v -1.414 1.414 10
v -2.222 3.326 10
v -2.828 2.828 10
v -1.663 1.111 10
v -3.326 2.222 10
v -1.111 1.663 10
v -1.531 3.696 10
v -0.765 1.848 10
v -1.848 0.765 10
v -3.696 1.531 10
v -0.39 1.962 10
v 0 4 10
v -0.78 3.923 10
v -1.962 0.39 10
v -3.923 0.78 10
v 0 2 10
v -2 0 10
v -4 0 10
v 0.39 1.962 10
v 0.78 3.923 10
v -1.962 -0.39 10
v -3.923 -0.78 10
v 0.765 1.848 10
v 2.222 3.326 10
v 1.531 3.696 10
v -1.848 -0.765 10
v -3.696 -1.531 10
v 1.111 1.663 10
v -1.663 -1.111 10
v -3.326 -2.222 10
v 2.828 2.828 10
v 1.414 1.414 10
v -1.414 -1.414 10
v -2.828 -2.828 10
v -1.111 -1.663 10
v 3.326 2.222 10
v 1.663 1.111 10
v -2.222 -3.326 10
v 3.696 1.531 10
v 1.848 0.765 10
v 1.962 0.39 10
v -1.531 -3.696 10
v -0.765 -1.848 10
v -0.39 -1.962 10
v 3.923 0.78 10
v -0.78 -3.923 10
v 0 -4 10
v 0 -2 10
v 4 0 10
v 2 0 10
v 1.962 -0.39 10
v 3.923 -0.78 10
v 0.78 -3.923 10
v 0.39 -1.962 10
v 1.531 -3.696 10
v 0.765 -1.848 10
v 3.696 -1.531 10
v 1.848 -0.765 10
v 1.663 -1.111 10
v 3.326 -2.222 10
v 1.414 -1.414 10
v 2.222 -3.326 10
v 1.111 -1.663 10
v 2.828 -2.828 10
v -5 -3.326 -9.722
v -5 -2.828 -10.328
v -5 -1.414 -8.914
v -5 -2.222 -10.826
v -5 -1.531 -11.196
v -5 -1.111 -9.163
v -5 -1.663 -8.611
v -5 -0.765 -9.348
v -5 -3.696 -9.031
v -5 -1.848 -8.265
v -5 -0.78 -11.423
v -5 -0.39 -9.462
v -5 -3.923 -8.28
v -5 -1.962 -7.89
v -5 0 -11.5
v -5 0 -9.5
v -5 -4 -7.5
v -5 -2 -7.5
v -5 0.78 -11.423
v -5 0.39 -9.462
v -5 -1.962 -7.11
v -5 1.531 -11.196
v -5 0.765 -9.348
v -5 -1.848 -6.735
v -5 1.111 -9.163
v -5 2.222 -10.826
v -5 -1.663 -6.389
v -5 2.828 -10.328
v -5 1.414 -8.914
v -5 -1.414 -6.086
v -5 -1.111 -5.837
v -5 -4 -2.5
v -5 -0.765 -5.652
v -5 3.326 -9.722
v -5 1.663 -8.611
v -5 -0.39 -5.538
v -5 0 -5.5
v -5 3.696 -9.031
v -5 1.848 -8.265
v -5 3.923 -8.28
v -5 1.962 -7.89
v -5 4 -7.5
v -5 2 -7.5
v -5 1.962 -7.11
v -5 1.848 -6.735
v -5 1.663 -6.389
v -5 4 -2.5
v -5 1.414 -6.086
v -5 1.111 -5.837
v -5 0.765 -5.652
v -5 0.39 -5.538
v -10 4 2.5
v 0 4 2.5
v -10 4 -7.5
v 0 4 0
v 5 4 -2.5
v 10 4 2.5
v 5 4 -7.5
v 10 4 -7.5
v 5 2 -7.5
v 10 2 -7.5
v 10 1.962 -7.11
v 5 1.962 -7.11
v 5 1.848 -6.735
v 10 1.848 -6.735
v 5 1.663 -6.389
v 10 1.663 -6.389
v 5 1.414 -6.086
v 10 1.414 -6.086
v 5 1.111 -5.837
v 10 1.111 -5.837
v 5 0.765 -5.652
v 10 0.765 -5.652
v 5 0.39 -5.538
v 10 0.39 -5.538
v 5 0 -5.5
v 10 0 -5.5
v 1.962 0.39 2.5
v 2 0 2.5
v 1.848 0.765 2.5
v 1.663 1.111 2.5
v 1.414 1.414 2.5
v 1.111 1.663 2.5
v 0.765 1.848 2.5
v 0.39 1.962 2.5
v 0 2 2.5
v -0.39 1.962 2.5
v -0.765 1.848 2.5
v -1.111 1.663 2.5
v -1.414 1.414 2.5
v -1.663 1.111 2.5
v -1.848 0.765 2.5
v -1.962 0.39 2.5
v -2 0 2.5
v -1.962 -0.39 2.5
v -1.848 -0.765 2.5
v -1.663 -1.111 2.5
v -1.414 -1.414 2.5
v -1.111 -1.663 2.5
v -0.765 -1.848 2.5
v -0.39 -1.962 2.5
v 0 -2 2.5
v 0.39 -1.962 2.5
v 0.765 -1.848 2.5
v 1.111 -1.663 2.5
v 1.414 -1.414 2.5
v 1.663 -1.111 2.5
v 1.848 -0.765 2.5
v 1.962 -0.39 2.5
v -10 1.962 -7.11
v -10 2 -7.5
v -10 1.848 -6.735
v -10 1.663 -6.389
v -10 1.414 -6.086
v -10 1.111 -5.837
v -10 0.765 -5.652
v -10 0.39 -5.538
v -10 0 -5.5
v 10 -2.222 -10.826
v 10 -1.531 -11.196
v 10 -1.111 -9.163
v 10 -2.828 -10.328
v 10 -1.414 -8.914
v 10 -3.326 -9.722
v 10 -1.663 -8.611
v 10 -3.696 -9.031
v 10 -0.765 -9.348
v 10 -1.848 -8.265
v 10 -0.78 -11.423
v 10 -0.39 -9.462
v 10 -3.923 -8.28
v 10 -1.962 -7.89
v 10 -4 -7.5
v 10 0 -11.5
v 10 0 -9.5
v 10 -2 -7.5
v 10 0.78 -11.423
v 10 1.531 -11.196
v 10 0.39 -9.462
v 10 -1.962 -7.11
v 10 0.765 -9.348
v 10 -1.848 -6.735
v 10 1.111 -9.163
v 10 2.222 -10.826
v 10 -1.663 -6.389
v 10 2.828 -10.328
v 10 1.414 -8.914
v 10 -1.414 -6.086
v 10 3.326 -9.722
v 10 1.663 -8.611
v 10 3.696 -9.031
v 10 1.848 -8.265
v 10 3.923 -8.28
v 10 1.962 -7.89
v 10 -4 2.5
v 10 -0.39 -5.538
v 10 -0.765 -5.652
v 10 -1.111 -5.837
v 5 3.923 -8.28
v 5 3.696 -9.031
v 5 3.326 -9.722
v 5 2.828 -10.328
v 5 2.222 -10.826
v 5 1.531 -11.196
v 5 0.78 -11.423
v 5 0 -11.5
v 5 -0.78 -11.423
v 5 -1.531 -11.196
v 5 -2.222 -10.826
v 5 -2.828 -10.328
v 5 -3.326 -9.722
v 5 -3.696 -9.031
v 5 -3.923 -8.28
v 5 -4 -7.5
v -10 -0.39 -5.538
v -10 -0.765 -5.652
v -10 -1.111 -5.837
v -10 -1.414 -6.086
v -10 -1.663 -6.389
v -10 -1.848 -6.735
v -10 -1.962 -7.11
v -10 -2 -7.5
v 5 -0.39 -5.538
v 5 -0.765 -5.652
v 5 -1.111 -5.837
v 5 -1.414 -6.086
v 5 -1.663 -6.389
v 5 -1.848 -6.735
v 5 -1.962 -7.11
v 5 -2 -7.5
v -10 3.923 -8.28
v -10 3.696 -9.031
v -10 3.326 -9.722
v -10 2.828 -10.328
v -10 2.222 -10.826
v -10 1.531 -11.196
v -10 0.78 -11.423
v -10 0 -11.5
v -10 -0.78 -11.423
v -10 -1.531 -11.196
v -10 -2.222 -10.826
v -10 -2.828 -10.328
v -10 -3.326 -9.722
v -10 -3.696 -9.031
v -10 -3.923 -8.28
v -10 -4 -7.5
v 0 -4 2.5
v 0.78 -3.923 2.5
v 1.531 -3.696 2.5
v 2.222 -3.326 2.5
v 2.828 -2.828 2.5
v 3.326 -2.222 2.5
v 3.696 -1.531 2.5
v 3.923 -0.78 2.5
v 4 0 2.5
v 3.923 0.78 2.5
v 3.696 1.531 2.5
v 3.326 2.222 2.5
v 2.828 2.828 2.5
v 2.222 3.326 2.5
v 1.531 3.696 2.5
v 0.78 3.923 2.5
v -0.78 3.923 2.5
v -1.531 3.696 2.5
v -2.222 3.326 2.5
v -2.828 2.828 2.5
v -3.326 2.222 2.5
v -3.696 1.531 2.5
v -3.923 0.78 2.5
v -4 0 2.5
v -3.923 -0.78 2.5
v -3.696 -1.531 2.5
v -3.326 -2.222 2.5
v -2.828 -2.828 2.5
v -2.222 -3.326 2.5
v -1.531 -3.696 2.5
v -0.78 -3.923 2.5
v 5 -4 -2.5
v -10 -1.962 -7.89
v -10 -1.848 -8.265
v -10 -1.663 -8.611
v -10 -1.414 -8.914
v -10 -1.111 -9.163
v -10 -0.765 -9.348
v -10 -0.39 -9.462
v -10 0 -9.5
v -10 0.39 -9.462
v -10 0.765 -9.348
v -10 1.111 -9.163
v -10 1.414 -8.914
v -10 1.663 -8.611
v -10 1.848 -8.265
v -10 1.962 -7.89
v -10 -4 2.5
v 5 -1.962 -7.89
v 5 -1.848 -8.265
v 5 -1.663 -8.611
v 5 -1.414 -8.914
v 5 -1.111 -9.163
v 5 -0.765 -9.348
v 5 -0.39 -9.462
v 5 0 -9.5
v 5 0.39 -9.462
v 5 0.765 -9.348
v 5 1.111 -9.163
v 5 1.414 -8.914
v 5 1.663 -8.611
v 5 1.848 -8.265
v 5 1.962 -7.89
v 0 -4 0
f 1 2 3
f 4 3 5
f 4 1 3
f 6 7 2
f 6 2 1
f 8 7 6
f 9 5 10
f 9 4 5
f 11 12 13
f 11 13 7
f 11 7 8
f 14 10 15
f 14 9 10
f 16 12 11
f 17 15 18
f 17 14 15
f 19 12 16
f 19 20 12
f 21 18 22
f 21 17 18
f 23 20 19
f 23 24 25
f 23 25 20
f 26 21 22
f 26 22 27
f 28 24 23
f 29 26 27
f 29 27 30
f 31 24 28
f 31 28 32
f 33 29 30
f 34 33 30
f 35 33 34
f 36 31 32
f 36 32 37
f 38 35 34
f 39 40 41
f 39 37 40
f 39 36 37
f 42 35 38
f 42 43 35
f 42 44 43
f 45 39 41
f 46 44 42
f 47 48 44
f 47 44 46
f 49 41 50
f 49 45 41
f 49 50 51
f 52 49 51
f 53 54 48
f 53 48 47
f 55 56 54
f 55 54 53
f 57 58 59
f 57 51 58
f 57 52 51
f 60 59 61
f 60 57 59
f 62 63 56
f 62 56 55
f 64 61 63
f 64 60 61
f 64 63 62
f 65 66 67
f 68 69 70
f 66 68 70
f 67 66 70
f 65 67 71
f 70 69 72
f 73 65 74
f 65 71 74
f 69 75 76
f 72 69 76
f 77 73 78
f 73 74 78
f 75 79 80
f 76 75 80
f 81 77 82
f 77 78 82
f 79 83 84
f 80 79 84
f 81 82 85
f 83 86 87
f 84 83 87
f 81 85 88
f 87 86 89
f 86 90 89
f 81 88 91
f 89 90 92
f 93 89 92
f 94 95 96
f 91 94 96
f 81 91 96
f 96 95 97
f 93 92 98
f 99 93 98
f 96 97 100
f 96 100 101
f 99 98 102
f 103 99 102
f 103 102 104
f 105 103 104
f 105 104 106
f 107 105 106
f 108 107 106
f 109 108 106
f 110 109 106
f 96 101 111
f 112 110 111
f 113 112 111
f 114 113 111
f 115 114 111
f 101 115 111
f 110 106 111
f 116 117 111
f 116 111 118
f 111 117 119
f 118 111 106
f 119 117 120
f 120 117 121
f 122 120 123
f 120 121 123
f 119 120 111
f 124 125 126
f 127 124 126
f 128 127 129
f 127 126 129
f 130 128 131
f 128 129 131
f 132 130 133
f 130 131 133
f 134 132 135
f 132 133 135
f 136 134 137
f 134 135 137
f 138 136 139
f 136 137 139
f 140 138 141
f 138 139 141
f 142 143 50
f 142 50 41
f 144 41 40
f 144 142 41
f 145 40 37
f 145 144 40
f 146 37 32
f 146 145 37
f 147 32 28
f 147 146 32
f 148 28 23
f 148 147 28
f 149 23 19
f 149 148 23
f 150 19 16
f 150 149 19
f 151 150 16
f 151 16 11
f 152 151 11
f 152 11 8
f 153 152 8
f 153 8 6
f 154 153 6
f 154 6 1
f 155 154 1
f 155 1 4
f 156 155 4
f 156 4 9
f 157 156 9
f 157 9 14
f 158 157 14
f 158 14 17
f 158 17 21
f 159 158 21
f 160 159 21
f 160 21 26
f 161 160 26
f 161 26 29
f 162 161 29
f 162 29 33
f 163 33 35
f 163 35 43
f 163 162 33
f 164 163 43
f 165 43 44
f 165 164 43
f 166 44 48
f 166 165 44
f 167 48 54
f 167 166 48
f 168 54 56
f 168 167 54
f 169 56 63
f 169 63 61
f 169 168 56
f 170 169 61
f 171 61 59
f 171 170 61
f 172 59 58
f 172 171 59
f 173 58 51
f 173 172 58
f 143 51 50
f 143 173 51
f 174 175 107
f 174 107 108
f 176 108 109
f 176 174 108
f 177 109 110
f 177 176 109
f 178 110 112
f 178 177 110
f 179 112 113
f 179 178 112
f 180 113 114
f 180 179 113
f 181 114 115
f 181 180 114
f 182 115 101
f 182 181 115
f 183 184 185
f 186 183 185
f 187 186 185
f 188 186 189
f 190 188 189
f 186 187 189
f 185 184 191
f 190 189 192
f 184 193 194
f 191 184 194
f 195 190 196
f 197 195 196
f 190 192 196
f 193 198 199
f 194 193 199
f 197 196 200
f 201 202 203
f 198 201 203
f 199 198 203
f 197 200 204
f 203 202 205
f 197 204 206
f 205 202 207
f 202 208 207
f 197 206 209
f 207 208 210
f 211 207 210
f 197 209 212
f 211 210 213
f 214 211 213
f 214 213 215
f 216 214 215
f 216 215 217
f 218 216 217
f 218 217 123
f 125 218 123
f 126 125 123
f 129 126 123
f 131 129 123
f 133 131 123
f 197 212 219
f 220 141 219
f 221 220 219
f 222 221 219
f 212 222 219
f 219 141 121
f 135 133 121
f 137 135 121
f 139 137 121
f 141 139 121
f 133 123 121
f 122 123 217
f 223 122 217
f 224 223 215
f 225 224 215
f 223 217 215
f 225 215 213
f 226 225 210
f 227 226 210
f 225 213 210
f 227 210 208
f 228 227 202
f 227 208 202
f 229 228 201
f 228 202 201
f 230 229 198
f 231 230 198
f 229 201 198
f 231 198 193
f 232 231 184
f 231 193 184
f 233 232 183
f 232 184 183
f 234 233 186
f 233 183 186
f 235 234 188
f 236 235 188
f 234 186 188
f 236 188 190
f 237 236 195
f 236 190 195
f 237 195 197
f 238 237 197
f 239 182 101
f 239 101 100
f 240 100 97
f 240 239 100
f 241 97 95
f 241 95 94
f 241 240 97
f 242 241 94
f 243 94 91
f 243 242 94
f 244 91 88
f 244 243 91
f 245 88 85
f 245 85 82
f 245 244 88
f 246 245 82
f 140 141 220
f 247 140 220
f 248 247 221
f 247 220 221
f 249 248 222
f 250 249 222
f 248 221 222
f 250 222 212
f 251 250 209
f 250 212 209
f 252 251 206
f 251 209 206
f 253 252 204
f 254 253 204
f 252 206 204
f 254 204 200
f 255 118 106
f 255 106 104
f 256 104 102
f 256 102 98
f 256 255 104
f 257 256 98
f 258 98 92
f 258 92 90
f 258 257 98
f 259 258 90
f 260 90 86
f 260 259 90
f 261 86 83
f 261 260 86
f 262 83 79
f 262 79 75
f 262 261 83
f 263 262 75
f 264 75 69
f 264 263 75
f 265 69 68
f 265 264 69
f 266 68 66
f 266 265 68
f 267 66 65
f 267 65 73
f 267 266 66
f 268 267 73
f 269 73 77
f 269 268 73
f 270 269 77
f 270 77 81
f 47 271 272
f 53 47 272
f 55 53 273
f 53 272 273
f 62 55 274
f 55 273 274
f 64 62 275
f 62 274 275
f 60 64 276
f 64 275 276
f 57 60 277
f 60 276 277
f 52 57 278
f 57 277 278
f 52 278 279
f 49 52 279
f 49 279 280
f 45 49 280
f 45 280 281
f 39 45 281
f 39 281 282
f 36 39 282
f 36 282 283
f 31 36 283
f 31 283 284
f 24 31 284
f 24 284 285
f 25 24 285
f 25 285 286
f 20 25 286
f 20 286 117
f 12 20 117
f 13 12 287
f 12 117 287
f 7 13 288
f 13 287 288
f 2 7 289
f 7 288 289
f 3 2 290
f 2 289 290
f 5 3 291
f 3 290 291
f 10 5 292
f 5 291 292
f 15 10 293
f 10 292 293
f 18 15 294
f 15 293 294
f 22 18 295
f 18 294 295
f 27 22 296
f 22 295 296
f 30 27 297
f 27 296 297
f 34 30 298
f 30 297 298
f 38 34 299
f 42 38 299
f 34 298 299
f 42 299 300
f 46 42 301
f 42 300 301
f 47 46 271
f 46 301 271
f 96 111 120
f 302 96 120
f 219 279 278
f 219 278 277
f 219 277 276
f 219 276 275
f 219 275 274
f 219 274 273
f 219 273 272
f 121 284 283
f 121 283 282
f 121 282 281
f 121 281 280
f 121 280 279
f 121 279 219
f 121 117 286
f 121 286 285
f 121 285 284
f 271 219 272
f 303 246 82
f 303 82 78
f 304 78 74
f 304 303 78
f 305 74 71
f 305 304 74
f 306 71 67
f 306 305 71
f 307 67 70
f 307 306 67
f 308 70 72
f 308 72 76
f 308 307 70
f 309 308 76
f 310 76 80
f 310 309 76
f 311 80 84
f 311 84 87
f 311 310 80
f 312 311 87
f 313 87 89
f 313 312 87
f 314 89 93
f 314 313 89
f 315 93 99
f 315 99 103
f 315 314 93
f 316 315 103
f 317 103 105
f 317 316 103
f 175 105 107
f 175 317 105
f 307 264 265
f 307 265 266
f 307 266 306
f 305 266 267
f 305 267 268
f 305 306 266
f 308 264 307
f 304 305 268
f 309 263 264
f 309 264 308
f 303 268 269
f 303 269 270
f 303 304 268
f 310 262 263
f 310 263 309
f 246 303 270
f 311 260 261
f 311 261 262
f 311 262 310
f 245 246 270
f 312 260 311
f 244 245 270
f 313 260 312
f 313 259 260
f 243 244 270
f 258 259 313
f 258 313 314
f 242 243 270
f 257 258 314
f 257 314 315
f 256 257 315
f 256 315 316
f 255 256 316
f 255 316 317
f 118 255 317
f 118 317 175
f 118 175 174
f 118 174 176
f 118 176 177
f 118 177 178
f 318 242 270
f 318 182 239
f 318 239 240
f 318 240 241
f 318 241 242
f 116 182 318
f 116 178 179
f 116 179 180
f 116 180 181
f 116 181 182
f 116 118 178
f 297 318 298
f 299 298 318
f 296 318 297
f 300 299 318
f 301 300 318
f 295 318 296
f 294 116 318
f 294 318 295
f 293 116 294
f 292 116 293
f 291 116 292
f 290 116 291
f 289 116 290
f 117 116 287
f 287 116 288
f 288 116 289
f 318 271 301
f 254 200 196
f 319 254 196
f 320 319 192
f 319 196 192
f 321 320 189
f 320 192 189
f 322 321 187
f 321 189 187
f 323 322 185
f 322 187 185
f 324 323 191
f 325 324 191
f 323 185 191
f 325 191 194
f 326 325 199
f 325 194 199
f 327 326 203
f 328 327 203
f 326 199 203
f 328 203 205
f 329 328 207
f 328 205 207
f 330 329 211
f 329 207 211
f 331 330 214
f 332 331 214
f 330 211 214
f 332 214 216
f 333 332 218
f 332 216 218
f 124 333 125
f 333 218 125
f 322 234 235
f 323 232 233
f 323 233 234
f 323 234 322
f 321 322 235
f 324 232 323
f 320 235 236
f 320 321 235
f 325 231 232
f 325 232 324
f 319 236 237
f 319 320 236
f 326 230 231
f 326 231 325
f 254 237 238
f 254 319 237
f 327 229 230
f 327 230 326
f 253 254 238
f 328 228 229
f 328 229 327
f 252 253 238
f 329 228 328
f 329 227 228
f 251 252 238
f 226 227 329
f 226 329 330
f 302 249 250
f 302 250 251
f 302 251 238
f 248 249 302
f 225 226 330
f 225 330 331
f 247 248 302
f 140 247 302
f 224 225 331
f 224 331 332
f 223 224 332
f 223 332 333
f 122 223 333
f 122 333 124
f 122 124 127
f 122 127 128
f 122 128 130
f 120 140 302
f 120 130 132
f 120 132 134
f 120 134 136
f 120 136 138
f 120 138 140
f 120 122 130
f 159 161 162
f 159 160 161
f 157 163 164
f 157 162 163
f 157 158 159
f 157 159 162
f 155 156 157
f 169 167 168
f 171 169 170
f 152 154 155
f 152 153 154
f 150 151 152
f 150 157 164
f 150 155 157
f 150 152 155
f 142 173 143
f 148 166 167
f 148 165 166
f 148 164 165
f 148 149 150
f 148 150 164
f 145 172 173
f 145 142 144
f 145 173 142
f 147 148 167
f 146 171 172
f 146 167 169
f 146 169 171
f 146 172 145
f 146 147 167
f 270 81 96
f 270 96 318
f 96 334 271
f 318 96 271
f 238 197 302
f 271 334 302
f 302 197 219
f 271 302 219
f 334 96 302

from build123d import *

# Parameters (mm, degrees)
SKETCH1_R           = 4
SKETCH1_R_2         = 2
BOSS_EXTRUDE1_DEPTH = 2.5
SKETCH1_3_R         = 4
SKETCH1_3_R_2       = 2
BOSS_EXTRUDE2_DEPTH = 10
BOSS_EXTRUDE3_DEPTH = 5


with BuildPart() as part:
    # Sketch1 → Boss-Extrude1 (new, symmetric)
    # profile 1 of 4: a face of its own
    with BuildSketch(Plane.XY):
        with BuildLine():
            Line((10, 4), (0, 4))
            ThreePointArc((0, 4), (2.828427125, 2.828427125), (4, 0))
            ThreePointArc((4, 0), (2.828427125, -2.828427125), (0, -4))
            Line((0, -4), (10, -4))
            Line((10, -4), (10, 4))
        make_face()
    # profile 2 of 4: a face of its own
    with BuildSketch(Plane.XY):
        with BuildLine():
            Line((0, 4), (-10, 4))
            Line((-10, 4), (-10, -4))
            Line((-10, -4), (0, -4))
            ThreePointArc((0, -4), (-4, 0), (0, 4))
        make_face()
    # profile 3 of 4: a face of its own
    with BuildSketch(Plane.XY):
        Circle(SKETCH1_R)
        Circle(SKETCH1_R_2, mode=Mode.SUBTRACT)
    # profile 4 of 4: a face of its own
    with BuildSketch(Plane.XY):
        Circle(SKETCH1_R_2)
    extrude(amount=BOSS_EXTRUDE1_DEPTH, both=True)

    # Sketch1<3> → Boss-Extrude2 (add)
    with BuildSketch(Plane.XY):
        with Locations(Location((0, 0, 0), (0, 0, 270))):
            Circle(SKETCH1_3_R)
        Circle(SKETCH1_3_R_2, mode=Mode.SUBTRACT)
    extrude(amount=BOSS_EXTRUDE2_DEPTH)

    # Sketch2 → Boss-Extrude3 (add)
    with BuildSketch(Plane.ZY.offset(10)):
        with BuildLine():
            Line((-2.5, -4), (-2.5, 4))
            Line((-2.5, 4), (-7.5, 4))
            ThreePointArc((-7.5, 4), (-4.671572875, 2.828427125), (-3.5, 0))
            ThreePointArc((-3.5, 0), (-4.671572875, -2.828427125), (-7.5, -4))
            Line((-7.5, -4), (-2.5, -4))
        make_face()
        with BuildLine():
            ThreePointArc((-3.5, 0), (-4.671572875, 2.828427125), (-7.5, 4))
            Line((-7.5, 4), (-7.5, 2))
            ThreePointArc((-7.5, 2), (-6.085786438, 1.414213562), (-5.5, 0))
            ThreePointArc((-5.5, 0), (-6.085786438, -1.414213562), (-7.5, -2))
            Line((-7.5, -2), (-7.5, -4))
            ThreePointArc((-7.5, -4), (-4.671572875, -2.828427125), (-3.5, 0))
        make_face()
        with BuildLine():
            Line((-7.5, 2), (-7.5, 4))
            ThreePointArc((-7.5, 4), (-11.5, 0), (-7.5, -4))
            Line((-7.5, -4), (-7.5, -2))
            ThreePointArc((-7.5, -2), (-9.5, 0), (-7.5, 2))
        make_face()
    boss_extrude3 = extrude(amount=-BOSS_EXTRUDE3_DEPTH)

    # Mirror1: Boss-Extrude3 across plane
    add(boss_extrude3.mirror(Plane(origin=(0, 0, 0), x_dir=(0, 0, 1), z_dir=(1, 0, 0))))


solid = part.part
